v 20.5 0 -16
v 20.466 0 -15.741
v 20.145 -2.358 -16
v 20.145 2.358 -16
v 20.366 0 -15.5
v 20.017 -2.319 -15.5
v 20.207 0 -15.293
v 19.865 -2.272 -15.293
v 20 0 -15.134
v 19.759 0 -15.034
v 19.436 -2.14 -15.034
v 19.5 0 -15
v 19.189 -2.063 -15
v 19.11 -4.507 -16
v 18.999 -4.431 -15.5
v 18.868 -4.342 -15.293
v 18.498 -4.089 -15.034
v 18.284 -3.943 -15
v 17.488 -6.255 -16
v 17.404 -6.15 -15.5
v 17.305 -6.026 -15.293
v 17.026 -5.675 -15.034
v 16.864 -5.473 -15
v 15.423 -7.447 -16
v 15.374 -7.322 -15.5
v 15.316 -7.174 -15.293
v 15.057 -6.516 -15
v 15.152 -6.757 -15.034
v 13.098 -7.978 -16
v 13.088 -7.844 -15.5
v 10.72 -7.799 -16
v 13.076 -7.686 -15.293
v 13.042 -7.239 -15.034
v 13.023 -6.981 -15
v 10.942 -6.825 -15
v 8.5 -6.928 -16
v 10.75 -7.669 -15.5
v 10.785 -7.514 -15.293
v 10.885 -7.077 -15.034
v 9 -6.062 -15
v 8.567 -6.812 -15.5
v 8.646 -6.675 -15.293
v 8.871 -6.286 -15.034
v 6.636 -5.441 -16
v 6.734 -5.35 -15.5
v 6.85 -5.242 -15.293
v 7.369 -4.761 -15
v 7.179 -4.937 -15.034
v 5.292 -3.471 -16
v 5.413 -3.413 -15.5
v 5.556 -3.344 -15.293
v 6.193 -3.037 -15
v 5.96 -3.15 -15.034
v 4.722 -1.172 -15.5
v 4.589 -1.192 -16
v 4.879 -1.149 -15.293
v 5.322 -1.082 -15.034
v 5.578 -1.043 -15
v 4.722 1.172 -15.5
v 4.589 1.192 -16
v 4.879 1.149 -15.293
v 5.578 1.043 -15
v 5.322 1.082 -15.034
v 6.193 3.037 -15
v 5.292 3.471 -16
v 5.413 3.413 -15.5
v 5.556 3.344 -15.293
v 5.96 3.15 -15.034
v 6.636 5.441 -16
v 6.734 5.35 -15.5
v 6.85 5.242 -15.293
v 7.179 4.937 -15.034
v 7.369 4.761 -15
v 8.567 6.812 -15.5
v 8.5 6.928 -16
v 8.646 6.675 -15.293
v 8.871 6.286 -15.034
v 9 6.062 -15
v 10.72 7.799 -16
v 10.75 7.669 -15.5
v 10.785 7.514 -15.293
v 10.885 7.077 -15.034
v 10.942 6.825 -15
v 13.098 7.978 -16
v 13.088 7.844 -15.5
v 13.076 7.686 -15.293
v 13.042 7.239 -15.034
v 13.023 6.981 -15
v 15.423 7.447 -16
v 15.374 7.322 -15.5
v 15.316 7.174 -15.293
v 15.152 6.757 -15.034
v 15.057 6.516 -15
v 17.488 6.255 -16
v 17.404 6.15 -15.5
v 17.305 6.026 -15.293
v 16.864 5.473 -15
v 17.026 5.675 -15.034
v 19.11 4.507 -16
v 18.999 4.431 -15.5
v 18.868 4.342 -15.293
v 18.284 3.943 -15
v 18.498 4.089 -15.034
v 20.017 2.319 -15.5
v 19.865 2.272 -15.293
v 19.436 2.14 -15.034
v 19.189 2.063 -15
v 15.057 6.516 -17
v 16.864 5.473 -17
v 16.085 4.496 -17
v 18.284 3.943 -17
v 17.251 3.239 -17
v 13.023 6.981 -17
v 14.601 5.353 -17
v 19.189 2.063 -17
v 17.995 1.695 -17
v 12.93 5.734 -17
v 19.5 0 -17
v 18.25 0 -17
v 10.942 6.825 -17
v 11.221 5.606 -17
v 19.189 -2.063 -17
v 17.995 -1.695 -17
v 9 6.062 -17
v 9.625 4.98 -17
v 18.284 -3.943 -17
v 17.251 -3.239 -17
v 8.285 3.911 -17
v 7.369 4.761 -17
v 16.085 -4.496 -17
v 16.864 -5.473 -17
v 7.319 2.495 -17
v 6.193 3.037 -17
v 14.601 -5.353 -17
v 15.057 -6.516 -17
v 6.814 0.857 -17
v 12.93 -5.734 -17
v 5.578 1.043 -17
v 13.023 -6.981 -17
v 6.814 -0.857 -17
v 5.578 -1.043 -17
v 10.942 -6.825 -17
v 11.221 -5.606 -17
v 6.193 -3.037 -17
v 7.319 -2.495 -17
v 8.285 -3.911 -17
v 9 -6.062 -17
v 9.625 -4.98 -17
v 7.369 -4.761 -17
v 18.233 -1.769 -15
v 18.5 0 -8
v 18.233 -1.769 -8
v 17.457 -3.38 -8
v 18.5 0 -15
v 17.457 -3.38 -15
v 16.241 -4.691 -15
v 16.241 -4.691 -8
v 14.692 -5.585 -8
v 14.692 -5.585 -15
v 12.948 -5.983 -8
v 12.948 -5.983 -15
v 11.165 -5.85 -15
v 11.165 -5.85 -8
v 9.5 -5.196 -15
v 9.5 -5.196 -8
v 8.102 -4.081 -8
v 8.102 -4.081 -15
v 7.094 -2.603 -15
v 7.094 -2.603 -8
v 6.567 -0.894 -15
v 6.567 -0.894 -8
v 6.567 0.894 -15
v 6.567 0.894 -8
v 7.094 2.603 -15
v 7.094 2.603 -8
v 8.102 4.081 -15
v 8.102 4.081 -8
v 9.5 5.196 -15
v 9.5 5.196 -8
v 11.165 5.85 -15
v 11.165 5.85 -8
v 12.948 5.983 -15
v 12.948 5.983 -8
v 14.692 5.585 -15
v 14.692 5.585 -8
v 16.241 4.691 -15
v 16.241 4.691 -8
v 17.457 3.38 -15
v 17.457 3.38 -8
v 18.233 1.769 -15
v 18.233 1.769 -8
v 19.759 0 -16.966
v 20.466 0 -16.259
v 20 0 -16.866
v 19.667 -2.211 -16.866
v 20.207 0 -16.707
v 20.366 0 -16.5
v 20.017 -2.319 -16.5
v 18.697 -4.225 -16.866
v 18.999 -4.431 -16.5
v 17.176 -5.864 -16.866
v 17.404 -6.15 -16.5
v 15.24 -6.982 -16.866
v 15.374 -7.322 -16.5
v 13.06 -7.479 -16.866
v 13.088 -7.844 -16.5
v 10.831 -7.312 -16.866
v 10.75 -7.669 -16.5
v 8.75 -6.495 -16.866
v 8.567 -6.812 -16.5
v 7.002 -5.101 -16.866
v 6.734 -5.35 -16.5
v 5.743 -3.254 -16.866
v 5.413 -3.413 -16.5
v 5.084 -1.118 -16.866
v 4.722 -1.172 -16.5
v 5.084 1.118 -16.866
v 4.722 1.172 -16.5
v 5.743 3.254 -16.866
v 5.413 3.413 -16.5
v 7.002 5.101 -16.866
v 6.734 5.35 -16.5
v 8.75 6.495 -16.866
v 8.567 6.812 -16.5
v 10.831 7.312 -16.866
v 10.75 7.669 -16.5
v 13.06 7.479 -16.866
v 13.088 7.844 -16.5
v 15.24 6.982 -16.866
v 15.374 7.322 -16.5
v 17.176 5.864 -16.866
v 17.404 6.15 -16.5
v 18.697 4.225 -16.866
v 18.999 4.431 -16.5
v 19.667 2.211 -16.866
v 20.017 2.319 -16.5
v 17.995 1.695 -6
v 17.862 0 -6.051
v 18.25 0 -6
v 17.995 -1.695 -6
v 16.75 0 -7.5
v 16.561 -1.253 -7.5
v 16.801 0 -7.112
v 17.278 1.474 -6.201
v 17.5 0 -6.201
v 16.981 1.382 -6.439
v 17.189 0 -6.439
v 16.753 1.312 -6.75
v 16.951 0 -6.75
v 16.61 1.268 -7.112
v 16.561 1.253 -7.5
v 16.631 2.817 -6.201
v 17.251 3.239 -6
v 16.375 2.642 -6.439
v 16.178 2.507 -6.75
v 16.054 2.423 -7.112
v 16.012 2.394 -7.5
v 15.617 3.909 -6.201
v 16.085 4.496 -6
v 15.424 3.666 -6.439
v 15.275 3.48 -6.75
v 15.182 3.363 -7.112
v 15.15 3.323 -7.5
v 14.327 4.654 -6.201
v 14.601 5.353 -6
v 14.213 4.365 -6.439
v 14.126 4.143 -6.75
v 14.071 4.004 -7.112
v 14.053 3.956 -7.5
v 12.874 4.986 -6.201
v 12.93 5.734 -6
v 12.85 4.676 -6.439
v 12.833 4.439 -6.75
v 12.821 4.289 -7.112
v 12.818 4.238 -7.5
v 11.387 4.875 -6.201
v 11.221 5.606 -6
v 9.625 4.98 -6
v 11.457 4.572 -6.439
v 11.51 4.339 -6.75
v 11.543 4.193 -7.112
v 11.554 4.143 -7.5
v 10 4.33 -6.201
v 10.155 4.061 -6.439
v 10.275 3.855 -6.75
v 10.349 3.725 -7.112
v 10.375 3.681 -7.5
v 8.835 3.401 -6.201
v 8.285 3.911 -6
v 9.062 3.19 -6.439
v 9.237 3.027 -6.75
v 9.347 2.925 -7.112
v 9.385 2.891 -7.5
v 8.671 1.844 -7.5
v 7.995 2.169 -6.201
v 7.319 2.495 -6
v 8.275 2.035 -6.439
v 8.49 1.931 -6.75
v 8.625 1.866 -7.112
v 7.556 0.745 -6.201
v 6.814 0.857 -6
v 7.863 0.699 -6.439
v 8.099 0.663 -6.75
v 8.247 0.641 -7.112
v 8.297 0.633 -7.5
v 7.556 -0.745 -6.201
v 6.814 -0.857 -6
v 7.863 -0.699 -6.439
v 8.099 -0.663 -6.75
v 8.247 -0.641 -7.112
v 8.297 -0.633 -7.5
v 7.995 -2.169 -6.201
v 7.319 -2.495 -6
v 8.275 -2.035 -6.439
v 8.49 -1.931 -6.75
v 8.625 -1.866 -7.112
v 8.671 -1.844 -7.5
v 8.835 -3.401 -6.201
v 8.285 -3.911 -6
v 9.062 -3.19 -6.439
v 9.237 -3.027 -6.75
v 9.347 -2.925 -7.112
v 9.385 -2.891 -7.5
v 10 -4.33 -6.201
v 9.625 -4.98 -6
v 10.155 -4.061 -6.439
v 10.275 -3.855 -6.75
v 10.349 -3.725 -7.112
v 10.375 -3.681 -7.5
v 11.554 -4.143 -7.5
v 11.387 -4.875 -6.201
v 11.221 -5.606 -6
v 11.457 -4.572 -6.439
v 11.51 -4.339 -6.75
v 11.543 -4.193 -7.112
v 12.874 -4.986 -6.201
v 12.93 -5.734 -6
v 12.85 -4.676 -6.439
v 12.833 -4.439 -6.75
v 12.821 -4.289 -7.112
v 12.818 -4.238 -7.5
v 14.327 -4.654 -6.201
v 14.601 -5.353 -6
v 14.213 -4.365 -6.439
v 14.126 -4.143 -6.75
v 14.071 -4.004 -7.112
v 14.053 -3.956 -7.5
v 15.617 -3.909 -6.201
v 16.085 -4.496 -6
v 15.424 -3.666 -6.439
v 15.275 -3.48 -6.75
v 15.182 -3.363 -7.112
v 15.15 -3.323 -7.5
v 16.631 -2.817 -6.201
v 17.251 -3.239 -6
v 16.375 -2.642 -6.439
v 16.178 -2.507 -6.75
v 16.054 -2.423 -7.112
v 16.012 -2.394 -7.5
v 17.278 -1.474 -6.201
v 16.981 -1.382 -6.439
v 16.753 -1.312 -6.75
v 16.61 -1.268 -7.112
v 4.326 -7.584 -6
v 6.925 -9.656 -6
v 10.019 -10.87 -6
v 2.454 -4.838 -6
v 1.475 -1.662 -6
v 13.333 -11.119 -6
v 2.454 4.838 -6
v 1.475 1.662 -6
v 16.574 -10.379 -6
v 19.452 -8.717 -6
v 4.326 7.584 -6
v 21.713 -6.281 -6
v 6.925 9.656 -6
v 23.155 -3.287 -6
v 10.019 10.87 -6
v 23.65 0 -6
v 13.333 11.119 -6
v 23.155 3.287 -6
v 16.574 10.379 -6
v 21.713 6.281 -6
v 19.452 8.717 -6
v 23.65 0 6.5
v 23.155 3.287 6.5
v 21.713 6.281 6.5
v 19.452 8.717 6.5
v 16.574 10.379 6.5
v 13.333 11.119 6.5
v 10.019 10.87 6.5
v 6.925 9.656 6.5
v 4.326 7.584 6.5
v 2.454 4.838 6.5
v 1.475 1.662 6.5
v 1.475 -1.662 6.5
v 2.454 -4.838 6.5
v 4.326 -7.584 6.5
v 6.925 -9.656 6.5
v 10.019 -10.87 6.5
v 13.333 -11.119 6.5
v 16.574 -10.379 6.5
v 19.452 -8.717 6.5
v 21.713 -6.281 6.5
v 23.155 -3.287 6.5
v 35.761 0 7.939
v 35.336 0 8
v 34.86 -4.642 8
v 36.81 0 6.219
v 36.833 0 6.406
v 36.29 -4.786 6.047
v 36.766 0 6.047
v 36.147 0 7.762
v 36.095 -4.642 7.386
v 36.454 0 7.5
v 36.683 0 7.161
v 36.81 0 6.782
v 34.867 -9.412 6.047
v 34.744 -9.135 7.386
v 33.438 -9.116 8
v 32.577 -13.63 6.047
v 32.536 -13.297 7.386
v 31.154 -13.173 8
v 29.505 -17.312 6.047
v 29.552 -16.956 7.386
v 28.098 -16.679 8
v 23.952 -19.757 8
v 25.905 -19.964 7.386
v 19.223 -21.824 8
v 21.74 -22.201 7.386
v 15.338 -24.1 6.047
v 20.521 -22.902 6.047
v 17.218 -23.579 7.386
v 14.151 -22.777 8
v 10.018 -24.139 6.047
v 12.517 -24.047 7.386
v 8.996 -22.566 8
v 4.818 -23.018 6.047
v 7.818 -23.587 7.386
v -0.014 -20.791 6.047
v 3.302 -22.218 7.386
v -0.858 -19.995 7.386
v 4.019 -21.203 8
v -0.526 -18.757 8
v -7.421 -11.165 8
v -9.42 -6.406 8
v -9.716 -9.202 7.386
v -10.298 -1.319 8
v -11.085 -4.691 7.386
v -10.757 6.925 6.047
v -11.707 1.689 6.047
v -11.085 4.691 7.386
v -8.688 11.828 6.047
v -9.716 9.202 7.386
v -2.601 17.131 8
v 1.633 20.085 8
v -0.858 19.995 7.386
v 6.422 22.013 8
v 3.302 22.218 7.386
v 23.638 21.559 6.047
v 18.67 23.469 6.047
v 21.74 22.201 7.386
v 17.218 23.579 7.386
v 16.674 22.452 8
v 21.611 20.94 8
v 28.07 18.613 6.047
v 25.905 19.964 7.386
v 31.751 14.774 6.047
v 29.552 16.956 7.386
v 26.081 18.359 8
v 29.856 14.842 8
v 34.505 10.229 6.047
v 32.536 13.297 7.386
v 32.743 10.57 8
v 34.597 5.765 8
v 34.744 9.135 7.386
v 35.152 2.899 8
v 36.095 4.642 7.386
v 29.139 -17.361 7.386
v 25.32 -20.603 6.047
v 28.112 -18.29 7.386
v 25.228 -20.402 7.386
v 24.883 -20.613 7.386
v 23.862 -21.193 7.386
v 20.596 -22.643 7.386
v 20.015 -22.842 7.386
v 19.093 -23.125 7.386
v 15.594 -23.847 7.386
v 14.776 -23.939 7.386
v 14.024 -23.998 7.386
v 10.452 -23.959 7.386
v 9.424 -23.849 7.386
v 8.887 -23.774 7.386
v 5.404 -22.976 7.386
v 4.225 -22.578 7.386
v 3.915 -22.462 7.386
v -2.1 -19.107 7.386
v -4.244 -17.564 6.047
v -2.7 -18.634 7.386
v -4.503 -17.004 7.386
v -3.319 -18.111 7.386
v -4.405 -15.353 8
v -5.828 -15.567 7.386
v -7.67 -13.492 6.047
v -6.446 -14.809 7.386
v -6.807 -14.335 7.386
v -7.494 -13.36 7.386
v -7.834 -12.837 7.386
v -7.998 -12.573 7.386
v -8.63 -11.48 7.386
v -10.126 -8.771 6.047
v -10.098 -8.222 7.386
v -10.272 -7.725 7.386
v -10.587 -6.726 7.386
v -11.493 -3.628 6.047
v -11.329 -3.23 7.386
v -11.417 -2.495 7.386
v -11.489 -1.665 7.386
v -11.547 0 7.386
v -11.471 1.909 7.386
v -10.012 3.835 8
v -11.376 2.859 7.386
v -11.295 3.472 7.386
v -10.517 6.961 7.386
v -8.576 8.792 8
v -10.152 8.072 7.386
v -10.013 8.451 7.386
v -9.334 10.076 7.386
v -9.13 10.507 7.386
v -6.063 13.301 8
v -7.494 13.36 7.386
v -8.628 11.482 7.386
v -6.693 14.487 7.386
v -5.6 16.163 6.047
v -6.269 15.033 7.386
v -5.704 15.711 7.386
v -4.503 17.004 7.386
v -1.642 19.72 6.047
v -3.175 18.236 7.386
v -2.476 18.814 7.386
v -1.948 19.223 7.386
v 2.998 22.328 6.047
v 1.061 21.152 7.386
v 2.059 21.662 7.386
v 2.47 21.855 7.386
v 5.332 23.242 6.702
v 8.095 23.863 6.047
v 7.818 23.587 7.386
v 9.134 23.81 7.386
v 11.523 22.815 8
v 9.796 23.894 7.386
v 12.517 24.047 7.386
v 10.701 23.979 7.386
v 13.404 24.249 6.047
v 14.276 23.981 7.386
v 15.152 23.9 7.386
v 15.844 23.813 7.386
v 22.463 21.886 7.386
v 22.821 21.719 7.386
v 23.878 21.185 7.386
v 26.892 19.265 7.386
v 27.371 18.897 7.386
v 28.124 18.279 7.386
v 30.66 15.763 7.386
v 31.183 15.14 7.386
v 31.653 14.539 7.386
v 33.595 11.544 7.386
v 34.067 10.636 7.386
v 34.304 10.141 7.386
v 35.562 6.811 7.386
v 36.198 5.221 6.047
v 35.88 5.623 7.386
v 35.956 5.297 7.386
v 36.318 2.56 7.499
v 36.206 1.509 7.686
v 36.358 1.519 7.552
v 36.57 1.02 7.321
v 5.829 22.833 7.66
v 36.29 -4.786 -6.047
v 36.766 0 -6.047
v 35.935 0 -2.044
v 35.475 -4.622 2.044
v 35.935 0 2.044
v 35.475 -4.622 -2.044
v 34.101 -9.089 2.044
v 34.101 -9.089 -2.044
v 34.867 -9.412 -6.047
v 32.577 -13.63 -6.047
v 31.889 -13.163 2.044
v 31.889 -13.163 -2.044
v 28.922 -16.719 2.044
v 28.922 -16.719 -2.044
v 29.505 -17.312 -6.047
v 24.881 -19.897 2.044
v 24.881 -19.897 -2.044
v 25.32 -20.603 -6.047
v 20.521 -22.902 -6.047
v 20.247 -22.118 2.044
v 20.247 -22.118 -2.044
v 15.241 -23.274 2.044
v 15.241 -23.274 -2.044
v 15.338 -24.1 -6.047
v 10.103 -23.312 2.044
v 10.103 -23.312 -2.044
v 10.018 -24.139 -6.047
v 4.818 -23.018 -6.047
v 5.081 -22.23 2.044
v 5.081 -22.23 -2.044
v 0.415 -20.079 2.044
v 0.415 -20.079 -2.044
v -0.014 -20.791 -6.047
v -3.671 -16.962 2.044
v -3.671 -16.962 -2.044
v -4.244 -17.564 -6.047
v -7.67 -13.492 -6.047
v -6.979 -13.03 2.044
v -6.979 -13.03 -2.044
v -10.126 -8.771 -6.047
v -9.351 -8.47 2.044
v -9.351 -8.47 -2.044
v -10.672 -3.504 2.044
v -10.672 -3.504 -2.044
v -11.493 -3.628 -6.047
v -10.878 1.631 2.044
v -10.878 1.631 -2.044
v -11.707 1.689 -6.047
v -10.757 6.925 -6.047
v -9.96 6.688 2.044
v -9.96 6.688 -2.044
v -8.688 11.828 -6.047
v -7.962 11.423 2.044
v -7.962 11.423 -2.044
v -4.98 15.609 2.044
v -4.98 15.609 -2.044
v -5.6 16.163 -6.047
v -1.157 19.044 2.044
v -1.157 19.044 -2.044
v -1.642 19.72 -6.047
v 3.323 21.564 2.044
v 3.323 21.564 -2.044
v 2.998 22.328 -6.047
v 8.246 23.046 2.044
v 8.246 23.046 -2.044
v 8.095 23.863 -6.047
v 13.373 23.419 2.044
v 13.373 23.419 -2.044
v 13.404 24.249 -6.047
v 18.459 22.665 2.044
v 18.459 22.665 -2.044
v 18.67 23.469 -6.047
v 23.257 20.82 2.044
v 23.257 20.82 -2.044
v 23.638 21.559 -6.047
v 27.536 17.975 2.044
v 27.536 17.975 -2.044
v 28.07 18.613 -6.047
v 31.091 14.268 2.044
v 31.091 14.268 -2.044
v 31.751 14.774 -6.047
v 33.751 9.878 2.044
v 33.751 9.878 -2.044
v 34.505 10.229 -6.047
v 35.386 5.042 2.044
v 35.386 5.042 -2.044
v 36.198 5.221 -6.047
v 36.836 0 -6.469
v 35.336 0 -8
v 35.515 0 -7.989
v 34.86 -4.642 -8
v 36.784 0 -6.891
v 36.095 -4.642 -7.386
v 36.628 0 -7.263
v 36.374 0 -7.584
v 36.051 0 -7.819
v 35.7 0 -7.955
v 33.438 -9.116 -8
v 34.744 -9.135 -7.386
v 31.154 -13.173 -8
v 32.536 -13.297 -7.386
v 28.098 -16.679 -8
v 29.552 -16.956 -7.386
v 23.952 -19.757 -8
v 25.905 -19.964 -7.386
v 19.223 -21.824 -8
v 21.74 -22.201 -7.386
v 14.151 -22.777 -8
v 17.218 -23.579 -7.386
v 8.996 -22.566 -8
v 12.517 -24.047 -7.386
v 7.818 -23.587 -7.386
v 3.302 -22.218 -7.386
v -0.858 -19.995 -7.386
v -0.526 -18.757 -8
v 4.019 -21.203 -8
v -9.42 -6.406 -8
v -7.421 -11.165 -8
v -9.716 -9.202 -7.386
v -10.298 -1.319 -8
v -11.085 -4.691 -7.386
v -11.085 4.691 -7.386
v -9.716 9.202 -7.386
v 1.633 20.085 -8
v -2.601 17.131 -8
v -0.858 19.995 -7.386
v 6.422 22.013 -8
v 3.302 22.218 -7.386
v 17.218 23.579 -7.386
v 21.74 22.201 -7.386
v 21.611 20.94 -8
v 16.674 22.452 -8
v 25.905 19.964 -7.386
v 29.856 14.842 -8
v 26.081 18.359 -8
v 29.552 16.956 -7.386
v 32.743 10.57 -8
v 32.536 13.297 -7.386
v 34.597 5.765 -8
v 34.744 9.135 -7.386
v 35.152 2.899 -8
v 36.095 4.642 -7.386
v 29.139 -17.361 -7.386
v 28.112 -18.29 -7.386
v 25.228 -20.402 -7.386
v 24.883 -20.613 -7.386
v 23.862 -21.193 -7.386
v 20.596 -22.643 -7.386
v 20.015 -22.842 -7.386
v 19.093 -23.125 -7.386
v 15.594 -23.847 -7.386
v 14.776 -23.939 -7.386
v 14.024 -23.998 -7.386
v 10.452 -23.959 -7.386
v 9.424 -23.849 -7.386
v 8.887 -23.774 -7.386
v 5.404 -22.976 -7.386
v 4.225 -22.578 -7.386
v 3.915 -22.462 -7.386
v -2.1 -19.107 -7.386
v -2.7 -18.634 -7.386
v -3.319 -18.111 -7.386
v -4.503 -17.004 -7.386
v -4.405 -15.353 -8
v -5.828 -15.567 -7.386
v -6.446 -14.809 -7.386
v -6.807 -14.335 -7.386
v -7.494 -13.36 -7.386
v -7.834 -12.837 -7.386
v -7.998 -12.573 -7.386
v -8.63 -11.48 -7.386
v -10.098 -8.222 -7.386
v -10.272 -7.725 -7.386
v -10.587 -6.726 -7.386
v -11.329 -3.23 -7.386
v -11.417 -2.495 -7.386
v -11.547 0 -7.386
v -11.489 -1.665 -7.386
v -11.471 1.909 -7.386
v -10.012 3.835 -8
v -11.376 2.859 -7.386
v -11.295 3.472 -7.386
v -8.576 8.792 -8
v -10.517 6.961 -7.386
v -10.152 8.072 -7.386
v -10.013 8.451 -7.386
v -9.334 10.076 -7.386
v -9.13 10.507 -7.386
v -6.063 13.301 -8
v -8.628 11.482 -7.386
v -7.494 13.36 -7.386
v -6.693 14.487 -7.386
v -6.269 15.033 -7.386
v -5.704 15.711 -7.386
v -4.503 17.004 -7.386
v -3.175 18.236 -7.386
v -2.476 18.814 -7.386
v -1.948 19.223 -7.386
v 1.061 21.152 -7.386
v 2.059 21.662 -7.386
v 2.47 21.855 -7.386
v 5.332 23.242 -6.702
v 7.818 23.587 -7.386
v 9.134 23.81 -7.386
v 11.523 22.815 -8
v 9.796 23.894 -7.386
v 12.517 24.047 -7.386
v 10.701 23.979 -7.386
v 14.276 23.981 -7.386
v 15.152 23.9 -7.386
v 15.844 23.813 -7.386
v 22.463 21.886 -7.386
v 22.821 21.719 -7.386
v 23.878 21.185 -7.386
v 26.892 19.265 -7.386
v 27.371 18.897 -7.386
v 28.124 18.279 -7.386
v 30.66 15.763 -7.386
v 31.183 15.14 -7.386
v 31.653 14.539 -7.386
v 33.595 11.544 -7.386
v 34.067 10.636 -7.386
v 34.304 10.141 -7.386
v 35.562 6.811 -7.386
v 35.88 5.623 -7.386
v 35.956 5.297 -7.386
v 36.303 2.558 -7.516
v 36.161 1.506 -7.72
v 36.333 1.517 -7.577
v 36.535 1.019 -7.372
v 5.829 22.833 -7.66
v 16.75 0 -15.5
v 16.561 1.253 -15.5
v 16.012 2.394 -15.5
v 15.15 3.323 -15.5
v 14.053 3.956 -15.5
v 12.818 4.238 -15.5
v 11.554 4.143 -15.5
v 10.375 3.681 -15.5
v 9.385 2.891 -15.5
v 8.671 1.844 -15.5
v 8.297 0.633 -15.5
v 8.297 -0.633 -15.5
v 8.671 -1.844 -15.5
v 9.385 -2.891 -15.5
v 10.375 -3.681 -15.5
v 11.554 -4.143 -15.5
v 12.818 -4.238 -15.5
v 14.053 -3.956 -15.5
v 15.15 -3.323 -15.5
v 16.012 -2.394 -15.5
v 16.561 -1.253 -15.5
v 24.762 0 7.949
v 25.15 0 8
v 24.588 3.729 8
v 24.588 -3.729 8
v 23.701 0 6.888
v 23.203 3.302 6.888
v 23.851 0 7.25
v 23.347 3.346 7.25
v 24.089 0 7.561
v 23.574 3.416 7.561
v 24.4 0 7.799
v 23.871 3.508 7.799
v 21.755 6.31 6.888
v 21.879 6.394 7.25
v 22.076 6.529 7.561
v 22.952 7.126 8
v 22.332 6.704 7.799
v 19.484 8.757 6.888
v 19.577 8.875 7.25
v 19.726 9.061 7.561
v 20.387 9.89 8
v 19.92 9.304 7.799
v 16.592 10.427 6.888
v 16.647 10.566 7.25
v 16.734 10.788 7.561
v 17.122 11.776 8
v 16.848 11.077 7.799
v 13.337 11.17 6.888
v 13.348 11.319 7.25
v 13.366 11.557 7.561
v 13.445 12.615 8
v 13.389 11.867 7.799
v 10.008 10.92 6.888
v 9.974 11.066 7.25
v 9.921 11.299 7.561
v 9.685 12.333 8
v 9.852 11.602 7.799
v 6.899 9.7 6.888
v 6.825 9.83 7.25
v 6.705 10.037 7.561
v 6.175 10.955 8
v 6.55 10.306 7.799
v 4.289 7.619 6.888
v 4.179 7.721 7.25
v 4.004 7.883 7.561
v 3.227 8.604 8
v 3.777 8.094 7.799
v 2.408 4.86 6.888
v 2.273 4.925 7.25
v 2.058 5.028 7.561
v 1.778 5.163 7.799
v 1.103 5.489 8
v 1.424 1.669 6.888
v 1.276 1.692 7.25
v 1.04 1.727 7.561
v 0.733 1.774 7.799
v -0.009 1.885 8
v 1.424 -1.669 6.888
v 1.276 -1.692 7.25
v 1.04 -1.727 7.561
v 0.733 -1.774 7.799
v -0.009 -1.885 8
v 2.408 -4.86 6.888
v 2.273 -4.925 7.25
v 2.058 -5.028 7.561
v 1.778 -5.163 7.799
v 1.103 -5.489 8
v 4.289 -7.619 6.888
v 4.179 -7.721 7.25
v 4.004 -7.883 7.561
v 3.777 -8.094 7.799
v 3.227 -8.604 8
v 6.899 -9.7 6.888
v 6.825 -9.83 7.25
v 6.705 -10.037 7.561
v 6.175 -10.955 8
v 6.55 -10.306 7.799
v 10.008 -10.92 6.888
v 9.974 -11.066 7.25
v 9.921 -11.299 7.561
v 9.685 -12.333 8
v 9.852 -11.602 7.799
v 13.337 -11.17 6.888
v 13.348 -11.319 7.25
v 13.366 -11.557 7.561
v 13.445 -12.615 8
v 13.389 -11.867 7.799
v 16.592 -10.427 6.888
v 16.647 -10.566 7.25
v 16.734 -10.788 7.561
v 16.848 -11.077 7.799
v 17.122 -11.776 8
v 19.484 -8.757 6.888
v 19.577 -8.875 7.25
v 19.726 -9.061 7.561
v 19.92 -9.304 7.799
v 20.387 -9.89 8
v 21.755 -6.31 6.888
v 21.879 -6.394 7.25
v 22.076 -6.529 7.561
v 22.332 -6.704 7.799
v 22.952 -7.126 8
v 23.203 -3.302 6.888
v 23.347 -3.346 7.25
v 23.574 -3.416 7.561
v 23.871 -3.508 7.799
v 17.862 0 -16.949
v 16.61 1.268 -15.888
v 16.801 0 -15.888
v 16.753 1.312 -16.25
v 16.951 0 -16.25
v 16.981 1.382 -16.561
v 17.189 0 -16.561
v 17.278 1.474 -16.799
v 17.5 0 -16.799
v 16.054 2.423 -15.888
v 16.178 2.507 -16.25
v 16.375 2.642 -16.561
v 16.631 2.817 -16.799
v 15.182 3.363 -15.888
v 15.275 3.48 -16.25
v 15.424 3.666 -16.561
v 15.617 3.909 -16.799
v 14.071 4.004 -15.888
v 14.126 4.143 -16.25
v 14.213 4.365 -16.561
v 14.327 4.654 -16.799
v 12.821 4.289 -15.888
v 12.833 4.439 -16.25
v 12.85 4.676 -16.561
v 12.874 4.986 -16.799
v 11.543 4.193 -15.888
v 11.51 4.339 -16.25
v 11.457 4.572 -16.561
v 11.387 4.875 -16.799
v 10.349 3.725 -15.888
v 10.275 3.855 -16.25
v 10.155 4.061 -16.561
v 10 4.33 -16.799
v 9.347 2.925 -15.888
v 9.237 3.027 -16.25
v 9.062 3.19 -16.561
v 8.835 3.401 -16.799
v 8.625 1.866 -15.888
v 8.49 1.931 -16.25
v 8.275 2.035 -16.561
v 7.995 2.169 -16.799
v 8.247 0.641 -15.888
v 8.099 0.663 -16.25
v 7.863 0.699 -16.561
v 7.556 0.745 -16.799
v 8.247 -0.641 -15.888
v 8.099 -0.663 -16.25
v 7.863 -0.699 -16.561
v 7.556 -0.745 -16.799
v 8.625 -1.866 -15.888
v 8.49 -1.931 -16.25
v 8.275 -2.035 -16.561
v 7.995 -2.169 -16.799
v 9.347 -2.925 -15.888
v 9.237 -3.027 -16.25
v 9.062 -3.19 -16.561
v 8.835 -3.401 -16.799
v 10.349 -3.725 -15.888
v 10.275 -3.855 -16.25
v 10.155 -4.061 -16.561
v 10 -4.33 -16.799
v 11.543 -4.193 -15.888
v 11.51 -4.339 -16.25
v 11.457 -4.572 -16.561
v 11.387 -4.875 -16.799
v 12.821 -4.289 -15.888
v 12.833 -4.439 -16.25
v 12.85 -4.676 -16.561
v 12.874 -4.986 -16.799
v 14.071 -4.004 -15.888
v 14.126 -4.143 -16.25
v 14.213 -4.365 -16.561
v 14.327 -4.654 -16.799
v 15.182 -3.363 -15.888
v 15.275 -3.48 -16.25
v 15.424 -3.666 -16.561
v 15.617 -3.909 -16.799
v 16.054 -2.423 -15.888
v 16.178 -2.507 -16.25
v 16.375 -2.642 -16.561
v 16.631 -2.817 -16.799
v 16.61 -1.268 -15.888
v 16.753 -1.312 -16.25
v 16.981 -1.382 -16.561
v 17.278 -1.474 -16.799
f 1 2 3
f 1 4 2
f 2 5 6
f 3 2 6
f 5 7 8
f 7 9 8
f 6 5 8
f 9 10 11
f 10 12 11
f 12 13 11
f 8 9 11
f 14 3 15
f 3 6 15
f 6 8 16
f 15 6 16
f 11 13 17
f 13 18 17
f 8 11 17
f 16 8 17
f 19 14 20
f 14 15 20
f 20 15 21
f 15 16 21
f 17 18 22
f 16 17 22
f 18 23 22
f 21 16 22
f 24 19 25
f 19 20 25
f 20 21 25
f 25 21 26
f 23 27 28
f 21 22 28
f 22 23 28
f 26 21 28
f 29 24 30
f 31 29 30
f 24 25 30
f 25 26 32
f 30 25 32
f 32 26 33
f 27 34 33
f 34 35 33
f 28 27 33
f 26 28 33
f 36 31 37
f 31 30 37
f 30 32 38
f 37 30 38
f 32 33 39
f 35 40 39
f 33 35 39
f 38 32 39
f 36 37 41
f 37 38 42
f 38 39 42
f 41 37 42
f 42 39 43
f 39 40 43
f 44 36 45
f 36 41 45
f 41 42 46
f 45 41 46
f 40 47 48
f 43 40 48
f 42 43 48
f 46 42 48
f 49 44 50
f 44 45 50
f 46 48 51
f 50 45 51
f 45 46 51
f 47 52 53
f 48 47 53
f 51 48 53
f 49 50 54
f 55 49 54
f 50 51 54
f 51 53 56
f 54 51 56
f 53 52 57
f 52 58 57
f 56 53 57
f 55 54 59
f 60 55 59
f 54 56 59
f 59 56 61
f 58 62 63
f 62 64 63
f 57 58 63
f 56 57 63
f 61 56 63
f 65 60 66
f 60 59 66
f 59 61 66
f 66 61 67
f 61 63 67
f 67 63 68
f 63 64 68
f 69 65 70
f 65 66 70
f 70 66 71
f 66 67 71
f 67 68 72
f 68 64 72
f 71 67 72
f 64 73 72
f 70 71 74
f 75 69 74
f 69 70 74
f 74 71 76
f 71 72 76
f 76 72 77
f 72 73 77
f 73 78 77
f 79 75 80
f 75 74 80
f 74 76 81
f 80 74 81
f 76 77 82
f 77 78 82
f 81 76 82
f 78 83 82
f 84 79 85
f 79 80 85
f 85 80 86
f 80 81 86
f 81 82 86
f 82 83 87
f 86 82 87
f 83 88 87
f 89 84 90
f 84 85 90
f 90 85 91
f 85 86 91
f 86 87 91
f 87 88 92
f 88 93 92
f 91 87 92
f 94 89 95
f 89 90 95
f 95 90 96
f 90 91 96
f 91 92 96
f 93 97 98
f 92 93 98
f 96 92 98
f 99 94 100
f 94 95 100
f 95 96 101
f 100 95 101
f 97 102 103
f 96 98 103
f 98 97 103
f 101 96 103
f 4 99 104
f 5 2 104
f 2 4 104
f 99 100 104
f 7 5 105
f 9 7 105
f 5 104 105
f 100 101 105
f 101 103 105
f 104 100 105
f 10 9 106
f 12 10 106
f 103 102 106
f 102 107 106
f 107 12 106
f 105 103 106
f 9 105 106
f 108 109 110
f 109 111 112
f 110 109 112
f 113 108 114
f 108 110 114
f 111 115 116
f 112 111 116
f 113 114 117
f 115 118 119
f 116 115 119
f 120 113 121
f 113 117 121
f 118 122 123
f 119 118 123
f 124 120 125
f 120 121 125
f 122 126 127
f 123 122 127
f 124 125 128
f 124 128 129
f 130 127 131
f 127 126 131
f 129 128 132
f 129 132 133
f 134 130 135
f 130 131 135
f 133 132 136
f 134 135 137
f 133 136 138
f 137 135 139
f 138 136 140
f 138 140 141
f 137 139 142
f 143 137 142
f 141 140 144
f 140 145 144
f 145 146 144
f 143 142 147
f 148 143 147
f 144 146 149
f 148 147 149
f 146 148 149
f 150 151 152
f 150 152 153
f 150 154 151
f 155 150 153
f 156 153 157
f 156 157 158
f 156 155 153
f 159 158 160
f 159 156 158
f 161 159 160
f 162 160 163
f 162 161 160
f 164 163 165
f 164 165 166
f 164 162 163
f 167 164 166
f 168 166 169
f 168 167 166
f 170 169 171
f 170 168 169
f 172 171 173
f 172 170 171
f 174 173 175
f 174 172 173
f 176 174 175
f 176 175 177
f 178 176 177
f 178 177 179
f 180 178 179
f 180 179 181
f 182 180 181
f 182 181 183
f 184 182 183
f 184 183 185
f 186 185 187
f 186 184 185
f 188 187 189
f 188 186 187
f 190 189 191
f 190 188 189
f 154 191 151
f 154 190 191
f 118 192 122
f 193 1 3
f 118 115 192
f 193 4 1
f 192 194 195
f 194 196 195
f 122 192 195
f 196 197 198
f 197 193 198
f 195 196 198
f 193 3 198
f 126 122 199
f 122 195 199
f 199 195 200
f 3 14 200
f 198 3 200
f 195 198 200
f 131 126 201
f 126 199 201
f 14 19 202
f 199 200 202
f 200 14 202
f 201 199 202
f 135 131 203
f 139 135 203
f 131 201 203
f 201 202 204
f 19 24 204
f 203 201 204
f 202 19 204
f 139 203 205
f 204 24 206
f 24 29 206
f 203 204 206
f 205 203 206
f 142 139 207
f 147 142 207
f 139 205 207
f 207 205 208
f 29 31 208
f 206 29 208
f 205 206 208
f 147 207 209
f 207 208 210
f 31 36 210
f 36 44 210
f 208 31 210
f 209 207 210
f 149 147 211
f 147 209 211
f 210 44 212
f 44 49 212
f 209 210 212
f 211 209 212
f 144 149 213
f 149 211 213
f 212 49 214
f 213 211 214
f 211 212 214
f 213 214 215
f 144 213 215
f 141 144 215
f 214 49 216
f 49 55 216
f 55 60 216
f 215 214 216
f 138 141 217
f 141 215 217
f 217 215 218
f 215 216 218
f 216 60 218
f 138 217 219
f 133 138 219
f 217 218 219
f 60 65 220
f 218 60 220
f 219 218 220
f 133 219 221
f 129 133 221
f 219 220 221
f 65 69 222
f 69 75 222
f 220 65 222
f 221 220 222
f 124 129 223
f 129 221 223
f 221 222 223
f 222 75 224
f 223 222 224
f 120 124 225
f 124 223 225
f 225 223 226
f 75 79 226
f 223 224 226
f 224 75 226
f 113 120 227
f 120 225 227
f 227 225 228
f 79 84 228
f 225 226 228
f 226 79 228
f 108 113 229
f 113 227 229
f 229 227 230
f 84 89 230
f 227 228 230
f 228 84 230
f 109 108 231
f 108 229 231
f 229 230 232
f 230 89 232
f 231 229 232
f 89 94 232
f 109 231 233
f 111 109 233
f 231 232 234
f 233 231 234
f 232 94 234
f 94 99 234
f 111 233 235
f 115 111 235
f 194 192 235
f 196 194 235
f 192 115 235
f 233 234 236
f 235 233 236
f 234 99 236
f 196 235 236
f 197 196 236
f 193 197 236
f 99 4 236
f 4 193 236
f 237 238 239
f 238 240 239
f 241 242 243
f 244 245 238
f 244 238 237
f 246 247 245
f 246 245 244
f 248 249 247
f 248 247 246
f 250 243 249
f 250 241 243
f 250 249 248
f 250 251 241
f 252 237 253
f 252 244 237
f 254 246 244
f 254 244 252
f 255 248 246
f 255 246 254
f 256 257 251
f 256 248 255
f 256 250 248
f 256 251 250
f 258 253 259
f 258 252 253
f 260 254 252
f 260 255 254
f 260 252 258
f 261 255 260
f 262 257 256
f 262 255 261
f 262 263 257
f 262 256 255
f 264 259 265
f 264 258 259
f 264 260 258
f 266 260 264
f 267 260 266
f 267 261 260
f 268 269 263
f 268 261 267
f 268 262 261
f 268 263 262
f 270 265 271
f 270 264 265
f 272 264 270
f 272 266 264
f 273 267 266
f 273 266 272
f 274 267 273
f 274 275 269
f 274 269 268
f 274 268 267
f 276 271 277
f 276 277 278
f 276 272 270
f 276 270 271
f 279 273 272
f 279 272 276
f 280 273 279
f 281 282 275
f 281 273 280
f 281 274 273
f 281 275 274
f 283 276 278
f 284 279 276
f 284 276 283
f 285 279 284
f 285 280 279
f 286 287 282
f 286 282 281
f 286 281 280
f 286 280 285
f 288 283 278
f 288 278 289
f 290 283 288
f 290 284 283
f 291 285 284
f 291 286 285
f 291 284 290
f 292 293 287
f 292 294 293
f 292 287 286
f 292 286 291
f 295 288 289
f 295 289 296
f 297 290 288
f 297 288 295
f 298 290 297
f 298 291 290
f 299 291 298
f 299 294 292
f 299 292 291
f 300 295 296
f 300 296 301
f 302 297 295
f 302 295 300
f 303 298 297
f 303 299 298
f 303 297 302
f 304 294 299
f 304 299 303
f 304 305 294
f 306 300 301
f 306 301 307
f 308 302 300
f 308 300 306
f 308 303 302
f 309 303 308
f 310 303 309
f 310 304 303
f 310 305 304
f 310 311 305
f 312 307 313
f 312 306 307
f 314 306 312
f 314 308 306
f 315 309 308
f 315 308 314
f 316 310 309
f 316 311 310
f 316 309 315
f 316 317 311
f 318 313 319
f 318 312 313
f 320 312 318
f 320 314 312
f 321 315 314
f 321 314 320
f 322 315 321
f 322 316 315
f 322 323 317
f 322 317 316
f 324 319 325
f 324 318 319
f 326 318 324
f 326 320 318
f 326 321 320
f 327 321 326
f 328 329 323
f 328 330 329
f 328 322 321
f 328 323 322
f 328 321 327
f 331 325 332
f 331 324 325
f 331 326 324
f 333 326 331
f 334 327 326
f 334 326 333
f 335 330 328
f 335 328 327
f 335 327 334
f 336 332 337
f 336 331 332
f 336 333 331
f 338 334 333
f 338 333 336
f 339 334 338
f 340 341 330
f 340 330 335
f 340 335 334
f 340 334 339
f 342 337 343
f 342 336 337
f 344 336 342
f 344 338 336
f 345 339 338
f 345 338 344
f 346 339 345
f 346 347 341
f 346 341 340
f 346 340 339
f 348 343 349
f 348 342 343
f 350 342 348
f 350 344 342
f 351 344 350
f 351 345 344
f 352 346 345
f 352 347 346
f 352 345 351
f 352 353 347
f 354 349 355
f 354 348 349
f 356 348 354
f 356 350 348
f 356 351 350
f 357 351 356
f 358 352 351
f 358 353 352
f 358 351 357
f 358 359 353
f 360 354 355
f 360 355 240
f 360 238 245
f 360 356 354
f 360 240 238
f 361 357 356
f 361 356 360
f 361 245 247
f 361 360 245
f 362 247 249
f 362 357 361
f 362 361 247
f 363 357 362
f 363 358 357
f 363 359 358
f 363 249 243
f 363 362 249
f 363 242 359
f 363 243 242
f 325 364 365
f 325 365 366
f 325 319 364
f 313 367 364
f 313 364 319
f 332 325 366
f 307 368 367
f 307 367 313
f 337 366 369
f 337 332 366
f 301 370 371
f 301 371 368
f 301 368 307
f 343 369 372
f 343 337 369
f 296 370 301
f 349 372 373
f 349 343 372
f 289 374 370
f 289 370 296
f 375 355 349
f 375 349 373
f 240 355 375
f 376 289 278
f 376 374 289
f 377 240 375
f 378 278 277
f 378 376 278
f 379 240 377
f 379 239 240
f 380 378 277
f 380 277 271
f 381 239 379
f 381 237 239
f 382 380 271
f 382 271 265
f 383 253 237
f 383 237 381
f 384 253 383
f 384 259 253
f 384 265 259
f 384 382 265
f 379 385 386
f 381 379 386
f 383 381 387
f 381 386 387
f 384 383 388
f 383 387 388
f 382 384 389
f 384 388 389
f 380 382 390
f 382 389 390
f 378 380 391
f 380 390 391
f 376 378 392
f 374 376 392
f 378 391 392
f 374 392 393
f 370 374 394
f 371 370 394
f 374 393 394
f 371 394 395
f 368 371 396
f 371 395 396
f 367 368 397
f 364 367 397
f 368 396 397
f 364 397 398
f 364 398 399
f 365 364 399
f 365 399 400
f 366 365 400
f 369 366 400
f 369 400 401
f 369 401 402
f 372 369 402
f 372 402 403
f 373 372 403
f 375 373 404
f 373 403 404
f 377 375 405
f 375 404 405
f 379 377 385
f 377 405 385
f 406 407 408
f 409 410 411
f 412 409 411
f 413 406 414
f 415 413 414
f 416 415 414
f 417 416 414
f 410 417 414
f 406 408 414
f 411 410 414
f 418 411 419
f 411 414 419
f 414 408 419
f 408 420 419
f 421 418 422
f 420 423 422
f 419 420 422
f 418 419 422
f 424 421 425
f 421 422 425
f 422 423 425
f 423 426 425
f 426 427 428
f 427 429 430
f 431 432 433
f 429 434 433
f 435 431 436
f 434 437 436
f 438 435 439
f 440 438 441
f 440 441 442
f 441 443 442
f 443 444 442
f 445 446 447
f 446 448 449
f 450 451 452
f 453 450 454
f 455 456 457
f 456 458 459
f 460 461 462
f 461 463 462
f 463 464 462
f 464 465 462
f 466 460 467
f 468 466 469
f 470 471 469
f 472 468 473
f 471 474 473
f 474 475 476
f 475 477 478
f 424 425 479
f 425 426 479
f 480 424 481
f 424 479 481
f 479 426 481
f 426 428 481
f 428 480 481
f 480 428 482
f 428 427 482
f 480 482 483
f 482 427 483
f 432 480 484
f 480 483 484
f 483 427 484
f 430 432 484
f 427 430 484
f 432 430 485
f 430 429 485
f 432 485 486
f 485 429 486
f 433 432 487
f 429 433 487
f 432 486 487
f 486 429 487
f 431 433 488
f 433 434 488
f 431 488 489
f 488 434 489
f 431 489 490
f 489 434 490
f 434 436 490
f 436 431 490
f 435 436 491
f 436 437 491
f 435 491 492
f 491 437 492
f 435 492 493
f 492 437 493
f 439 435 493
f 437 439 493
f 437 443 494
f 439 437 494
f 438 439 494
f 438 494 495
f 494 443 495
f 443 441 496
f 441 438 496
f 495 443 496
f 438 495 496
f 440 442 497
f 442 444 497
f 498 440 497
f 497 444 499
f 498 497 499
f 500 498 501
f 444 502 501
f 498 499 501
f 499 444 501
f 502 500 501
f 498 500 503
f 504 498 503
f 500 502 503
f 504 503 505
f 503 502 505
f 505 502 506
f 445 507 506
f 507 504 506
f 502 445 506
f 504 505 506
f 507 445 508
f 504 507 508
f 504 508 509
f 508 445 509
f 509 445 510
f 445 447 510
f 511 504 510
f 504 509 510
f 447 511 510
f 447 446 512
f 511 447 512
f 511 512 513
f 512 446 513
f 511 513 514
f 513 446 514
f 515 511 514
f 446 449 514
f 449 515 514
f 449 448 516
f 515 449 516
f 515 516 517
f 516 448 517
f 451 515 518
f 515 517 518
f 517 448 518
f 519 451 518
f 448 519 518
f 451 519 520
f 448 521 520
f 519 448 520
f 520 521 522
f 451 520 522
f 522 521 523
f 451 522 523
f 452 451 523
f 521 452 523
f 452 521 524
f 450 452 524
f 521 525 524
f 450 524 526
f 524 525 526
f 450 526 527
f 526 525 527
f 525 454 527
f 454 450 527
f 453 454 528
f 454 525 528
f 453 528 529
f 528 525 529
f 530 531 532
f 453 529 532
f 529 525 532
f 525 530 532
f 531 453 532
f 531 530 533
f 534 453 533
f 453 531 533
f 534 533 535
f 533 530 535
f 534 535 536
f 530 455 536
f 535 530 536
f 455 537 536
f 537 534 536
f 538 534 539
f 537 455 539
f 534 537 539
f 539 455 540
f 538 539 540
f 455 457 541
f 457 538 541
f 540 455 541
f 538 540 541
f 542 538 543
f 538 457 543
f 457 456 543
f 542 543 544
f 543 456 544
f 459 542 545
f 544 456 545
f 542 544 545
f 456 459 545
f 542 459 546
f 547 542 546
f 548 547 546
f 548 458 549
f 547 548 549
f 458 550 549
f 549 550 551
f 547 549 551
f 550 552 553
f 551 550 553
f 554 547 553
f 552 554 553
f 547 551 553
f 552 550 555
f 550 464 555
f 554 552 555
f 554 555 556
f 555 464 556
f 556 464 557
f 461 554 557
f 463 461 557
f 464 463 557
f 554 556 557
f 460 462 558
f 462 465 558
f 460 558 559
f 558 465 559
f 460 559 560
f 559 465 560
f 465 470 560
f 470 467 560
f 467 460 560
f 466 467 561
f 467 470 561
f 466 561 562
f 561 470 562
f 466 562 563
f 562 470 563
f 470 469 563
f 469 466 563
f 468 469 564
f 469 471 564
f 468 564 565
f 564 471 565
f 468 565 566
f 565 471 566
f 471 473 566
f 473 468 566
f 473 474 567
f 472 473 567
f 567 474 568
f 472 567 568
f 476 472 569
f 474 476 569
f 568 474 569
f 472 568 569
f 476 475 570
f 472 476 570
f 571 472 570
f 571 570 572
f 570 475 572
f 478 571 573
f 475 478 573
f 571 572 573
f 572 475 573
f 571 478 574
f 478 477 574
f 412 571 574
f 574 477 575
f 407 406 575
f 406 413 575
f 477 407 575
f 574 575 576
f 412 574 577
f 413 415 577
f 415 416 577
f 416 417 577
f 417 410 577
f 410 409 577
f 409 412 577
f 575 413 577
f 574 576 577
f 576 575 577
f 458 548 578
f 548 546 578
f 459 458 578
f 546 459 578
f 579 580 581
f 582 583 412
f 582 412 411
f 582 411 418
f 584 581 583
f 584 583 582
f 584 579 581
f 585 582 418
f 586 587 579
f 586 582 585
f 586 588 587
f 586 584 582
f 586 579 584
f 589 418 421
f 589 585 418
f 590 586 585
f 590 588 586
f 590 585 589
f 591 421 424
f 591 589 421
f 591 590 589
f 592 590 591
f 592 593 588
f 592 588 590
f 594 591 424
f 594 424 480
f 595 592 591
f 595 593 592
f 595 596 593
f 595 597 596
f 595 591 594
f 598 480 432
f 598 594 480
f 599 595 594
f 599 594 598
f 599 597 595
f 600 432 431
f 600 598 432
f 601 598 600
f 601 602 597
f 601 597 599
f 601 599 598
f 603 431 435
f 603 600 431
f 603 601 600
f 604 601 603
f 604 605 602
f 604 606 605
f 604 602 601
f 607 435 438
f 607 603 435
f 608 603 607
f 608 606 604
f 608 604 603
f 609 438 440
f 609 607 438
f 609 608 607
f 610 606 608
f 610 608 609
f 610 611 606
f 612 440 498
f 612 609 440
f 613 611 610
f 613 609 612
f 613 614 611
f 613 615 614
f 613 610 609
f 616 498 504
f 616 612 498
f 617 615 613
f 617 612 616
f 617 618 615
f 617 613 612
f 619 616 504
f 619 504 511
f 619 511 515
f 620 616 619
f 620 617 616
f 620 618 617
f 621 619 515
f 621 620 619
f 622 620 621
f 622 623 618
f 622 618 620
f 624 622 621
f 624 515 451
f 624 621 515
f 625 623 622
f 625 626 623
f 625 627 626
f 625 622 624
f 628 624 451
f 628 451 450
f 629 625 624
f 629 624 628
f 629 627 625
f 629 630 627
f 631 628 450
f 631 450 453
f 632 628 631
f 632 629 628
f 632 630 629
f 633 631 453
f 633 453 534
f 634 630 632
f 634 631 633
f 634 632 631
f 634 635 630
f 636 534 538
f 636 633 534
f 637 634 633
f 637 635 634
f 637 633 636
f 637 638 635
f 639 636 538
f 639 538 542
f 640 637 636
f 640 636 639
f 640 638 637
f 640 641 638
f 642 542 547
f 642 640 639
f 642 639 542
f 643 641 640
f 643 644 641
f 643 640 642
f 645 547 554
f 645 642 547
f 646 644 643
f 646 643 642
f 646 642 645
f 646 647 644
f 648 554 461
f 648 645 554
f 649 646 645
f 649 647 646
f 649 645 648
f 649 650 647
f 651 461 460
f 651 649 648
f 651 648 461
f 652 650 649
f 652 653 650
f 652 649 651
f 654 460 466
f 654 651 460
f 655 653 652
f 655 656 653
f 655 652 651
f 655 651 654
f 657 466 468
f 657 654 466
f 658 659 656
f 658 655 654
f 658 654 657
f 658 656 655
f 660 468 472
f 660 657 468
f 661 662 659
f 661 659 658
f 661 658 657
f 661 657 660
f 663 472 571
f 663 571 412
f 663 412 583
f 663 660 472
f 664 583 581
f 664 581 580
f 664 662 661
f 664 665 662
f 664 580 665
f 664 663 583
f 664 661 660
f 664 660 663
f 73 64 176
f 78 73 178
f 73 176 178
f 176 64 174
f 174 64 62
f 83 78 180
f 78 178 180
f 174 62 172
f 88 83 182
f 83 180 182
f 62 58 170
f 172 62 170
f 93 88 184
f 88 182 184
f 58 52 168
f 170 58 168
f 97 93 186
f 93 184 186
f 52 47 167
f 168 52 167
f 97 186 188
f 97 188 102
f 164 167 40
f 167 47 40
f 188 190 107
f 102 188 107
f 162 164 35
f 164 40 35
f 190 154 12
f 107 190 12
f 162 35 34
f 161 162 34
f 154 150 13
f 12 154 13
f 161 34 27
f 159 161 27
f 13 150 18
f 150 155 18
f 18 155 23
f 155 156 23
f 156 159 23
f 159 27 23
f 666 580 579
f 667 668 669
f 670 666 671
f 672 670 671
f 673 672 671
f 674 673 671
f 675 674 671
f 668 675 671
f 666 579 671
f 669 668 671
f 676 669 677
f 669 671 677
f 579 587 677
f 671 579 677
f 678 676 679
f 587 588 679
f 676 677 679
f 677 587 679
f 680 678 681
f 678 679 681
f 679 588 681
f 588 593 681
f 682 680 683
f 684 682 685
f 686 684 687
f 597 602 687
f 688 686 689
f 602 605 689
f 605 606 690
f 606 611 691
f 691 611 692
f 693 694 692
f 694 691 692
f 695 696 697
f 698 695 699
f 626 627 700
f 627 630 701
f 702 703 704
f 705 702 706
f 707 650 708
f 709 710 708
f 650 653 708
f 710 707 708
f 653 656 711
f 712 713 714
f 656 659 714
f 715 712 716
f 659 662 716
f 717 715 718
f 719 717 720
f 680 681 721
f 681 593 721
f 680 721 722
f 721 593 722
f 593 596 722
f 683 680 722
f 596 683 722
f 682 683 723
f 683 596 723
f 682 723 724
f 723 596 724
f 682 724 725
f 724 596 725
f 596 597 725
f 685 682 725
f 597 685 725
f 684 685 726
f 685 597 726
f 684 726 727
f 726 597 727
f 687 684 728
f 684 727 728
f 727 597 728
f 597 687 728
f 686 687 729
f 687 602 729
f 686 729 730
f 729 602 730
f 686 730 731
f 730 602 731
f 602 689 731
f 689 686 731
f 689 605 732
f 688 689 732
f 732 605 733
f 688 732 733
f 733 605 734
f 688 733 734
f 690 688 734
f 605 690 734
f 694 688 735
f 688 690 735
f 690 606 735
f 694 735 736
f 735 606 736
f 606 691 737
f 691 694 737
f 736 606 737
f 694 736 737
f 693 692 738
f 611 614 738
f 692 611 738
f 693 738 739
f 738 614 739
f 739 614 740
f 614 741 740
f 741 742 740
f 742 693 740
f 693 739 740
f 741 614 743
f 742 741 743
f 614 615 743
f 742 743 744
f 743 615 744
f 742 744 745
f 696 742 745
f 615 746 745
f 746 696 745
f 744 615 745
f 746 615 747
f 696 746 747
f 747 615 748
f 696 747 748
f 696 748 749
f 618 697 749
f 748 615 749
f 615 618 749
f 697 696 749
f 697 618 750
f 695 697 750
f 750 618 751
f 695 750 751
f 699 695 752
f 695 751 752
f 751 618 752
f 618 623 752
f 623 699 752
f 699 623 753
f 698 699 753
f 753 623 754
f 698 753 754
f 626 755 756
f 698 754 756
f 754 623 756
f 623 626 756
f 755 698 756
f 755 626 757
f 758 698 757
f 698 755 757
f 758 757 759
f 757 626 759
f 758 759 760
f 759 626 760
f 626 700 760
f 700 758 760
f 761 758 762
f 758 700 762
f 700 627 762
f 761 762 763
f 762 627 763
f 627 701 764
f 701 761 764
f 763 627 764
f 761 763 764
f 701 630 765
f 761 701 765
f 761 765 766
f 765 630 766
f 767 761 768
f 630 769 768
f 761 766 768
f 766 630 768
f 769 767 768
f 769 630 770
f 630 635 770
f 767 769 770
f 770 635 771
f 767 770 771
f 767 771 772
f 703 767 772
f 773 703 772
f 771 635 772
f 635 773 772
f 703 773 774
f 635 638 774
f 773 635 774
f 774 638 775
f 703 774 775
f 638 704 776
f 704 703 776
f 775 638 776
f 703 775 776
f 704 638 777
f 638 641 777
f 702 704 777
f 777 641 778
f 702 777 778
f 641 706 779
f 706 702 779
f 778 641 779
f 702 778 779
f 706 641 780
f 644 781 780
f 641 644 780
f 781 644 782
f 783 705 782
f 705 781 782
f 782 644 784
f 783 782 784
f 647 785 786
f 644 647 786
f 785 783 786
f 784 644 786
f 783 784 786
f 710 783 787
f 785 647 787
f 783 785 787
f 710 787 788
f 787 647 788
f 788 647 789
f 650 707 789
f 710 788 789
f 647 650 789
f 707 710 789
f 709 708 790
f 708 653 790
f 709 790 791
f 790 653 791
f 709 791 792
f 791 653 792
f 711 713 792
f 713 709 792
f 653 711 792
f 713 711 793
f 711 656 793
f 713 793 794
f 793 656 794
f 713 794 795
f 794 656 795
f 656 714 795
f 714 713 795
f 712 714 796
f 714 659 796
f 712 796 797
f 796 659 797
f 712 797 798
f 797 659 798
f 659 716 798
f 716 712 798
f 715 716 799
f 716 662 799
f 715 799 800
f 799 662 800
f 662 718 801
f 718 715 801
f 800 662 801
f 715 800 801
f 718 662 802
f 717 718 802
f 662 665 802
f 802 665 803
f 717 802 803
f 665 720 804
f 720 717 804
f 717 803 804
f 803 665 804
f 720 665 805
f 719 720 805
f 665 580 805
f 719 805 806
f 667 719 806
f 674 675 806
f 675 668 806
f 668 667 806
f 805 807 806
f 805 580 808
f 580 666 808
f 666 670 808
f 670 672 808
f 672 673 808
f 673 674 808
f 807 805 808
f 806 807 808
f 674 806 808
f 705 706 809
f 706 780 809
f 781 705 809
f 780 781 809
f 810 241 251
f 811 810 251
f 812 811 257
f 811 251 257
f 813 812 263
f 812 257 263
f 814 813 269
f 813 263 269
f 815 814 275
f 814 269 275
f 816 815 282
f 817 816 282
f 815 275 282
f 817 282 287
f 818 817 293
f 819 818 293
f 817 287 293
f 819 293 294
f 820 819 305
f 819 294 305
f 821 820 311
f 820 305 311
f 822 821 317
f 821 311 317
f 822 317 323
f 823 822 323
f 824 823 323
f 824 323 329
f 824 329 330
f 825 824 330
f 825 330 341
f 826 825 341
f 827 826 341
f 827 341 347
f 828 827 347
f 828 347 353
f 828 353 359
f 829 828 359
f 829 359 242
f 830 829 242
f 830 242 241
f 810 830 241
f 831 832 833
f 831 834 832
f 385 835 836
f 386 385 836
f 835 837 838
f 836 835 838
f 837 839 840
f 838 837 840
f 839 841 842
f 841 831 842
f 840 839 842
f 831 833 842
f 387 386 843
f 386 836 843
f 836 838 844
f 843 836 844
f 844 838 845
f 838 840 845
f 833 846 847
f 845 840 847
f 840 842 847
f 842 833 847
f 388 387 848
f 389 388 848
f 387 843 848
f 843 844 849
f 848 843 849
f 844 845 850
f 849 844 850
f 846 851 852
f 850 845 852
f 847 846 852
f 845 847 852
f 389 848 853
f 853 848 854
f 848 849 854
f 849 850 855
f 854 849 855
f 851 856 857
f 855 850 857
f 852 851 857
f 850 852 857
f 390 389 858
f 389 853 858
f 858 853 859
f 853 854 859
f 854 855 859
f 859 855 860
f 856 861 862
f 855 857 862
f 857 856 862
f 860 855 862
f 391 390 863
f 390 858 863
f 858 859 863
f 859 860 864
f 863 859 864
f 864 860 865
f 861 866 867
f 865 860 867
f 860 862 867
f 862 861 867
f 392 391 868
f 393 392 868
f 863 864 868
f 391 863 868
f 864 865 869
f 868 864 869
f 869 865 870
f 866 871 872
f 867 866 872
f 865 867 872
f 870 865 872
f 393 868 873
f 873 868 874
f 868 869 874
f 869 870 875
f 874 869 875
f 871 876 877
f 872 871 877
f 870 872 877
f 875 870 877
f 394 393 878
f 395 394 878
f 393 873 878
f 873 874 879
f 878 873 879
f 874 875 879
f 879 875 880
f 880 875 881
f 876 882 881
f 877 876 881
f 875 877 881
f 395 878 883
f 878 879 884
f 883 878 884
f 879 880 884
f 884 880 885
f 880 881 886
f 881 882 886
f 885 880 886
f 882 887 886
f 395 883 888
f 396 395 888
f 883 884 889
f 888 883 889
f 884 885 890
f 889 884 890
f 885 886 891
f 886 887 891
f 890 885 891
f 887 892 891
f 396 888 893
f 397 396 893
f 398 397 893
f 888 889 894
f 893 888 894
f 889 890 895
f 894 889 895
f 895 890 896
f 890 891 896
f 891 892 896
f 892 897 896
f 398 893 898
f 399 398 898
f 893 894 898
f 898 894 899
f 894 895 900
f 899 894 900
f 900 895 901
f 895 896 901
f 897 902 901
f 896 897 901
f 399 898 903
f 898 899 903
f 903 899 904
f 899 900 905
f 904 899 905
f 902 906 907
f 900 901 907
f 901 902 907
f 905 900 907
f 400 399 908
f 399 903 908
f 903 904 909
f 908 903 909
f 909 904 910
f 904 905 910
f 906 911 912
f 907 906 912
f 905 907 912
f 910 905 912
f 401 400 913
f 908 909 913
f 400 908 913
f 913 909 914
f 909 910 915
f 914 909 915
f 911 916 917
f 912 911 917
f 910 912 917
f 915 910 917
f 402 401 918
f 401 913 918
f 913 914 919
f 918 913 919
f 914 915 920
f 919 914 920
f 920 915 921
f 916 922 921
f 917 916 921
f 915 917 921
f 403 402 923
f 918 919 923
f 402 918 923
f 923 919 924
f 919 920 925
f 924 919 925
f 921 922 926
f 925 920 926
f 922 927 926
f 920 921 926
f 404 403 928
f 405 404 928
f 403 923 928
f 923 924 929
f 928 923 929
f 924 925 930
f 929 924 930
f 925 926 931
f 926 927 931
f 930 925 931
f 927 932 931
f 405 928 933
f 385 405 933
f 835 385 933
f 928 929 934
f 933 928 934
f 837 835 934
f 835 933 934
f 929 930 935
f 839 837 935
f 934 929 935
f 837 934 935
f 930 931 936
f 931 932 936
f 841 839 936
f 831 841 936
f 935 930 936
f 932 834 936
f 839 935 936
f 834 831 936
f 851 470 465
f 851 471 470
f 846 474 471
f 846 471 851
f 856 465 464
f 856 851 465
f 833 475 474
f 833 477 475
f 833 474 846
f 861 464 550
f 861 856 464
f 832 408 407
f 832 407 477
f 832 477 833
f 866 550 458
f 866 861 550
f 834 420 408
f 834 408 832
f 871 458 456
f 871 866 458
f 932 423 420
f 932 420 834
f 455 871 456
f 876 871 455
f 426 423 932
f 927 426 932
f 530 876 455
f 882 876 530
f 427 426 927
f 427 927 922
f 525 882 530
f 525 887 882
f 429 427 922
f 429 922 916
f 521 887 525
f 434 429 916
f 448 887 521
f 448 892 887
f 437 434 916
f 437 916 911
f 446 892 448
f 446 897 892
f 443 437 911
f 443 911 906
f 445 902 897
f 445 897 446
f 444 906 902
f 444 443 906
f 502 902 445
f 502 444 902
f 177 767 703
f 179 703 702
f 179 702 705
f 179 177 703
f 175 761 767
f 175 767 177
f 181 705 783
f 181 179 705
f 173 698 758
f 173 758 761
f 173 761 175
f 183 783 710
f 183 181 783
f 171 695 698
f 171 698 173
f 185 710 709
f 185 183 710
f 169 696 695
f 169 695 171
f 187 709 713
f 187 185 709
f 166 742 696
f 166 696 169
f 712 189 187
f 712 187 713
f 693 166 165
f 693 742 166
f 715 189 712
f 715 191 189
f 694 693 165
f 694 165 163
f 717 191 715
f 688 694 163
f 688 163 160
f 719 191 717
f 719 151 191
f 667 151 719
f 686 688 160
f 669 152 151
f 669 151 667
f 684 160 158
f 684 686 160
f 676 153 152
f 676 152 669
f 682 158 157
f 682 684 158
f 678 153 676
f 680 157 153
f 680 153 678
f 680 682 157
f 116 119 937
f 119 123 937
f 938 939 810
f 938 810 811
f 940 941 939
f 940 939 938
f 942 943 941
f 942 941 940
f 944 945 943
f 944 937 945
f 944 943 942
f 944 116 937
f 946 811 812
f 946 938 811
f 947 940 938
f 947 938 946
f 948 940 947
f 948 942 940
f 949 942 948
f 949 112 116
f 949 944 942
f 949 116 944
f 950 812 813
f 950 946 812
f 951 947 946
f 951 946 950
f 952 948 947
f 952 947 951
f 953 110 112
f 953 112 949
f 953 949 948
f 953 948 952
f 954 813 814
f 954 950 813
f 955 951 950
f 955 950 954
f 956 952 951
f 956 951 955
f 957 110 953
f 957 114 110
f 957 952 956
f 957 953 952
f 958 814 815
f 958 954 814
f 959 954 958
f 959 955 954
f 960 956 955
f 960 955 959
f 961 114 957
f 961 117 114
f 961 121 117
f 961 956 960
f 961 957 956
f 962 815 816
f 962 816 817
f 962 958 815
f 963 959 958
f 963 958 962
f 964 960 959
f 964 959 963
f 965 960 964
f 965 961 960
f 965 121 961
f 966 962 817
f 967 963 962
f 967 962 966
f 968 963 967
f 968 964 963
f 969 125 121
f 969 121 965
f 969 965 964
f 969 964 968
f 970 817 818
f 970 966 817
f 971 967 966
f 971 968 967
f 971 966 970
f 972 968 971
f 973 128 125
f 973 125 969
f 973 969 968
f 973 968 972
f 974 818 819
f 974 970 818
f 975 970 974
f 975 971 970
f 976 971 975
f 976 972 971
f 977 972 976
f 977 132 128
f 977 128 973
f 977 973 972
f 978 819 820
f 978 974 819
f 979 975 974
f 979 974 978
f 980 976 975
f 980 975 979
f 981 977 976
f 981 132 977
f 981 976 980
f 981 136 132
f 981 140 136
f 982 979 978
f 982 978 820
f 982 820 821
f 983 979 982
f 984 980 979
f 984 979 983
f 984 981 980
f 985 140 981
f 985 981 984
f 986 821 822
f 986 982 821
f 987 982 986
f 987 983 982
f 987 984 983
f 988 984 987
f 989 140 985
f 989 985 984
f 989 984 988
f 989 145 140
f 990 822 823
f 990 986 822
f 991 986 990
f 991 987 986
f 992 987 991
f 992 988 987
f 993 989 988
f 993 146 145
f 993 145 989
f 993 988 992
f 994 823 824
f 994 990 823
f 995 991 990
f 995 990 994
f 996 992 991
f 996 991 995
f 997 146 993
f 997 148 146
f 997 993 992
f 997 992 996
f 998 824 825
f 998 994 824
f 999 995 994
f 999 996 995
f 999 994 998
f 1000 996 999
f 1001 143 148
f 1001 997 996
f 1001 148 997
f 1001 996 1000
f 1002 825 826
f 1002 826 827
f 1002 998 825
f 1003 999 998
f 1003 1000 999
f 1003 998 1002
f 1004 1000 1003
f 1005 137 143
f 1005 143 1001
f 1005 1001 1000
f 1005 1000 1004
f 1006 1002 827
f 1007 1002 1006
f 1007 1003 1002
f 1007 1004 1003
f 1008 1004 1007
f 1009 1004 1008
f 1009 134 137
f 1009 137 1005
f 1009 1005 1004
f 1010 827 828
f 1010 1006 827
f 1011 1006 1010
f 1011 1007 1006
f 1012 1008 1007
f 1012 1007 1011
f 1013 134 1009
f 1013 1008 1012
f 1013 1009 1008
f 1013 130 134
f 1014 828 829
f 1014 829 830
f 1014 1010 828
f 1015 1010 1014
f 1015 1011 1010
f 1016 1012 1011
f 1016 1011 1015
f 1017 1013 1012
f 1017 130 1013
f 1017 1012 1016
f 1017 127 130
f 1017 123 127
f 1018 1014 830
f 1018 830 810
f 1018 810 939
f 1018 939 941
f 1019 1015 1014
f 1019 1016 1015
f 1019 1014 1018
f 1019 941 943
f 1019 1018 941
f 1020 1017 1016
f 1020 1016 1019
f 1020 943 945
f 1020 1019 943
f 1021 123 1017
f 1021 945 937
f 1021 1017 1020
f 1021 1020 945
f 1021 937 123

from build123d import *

# Parameters (mm, degrees)
SKETCH2_W          = 6
SKETCH2_H          = 7
SKETCH3_R          = 11.15
CUT_EXTRUDE1_DEPTH = 14
SKETCH8_R          = 4.25
CUT_EXTRUDE3_DEPTH = 48.193749586
FILLET1_R          = 1.5
FILLET2_R          = 1.5
FILLET5_R          = 1.5
FILLET6_R          = 1


with BuildPart() as part:
    # Sketch2 → Revolve1 (revolve)
    with BuildSketch(Plane(origin=(0, 0, 0), x_dir=(1, 0, 0), z_dir=(0, 1, 0)), mode=Mode.PRIVATE) as revolve1_sk:
        with BuildLine():
            Line((-12.5, 8), (12.5, 8))
            Line((12.5, 8), (12.5, -8))
            Line((12.5, -8), (-12.5, -8))
            ThreePointArc((-12.5, -8), (-10.83030278, 0), (-12.5, 8))
        make_face()
        with Locations((9.5, 11.5)):
            Rectangle(SKETCH2_W, SKETCH2_H)
        Polygon((6.5, 15), (12.5, 15), (12.5, 17), (4.5, 17), (4.5, 15), align=None)
    revolve(revolve1_sk.sketch.rotate(Axis((12.5, 0, 8), (0, 0, -1)), 180), axis=Axis((12.5, 0, 8), (0, 0, -1)))

    # Sketch3 → Cut-Extrude1 (cut)
    with BuildSketch(Plane.XY.offset(8)):
        with Locations((12.5, 0)):
            Circle(SKETCH3_R)
    extrude(amount=-CUT_EXTRUDE1_DEPTH, mode=Mode.SUBTRACT)

    # Sketch8 → Cut-Extrude3 (cut, through all)
    with BuildSketch(Plane.XY.offset(-6)):
        with Locations((12.5, 0)):
            Circle(SKETCH8_R)
    extrude(amount=-CUT_EXTRUDE3_DEPTH, mode=Mode.SUBTRACT)

    # Fillet1
    fillet1_edges = [part.edges().sort_by_distance(p)[0] for p in [
        (8.25, 0, -6),
    ]]
    fillet(fillet1_edges, radius=FILLET1_R)

    # Fillet2
    fillet2_edges = [part.edges().sort_by_distance(p)[0] for p in [
        (-12.5, 0, 8),
        (-12.5, 0, -8),
        (1.35, 0, 8),
    ]]
    fillet(fillet2_edges, radius=FILLET2_R)

    # Fillet5
    fillet5_edges = [part.edges().sort_by_distance(p)[0] for p in [
        (8.25, 0, -17),
    ]]
    fillet(fillet5_edges, radius=FILLET5_R)

    # Fillet6
    fillet6_edges = [part.edges().sort_by_distance(p)[0] for p in [
        (4.5, 0, -15),
        (4.5, 0, -17),
    ]]
    fillet(fillet6_edges, radius=FILLET6_R - 0.0001)  # a hair under: the kernel refuses the full size


solid = part.part
